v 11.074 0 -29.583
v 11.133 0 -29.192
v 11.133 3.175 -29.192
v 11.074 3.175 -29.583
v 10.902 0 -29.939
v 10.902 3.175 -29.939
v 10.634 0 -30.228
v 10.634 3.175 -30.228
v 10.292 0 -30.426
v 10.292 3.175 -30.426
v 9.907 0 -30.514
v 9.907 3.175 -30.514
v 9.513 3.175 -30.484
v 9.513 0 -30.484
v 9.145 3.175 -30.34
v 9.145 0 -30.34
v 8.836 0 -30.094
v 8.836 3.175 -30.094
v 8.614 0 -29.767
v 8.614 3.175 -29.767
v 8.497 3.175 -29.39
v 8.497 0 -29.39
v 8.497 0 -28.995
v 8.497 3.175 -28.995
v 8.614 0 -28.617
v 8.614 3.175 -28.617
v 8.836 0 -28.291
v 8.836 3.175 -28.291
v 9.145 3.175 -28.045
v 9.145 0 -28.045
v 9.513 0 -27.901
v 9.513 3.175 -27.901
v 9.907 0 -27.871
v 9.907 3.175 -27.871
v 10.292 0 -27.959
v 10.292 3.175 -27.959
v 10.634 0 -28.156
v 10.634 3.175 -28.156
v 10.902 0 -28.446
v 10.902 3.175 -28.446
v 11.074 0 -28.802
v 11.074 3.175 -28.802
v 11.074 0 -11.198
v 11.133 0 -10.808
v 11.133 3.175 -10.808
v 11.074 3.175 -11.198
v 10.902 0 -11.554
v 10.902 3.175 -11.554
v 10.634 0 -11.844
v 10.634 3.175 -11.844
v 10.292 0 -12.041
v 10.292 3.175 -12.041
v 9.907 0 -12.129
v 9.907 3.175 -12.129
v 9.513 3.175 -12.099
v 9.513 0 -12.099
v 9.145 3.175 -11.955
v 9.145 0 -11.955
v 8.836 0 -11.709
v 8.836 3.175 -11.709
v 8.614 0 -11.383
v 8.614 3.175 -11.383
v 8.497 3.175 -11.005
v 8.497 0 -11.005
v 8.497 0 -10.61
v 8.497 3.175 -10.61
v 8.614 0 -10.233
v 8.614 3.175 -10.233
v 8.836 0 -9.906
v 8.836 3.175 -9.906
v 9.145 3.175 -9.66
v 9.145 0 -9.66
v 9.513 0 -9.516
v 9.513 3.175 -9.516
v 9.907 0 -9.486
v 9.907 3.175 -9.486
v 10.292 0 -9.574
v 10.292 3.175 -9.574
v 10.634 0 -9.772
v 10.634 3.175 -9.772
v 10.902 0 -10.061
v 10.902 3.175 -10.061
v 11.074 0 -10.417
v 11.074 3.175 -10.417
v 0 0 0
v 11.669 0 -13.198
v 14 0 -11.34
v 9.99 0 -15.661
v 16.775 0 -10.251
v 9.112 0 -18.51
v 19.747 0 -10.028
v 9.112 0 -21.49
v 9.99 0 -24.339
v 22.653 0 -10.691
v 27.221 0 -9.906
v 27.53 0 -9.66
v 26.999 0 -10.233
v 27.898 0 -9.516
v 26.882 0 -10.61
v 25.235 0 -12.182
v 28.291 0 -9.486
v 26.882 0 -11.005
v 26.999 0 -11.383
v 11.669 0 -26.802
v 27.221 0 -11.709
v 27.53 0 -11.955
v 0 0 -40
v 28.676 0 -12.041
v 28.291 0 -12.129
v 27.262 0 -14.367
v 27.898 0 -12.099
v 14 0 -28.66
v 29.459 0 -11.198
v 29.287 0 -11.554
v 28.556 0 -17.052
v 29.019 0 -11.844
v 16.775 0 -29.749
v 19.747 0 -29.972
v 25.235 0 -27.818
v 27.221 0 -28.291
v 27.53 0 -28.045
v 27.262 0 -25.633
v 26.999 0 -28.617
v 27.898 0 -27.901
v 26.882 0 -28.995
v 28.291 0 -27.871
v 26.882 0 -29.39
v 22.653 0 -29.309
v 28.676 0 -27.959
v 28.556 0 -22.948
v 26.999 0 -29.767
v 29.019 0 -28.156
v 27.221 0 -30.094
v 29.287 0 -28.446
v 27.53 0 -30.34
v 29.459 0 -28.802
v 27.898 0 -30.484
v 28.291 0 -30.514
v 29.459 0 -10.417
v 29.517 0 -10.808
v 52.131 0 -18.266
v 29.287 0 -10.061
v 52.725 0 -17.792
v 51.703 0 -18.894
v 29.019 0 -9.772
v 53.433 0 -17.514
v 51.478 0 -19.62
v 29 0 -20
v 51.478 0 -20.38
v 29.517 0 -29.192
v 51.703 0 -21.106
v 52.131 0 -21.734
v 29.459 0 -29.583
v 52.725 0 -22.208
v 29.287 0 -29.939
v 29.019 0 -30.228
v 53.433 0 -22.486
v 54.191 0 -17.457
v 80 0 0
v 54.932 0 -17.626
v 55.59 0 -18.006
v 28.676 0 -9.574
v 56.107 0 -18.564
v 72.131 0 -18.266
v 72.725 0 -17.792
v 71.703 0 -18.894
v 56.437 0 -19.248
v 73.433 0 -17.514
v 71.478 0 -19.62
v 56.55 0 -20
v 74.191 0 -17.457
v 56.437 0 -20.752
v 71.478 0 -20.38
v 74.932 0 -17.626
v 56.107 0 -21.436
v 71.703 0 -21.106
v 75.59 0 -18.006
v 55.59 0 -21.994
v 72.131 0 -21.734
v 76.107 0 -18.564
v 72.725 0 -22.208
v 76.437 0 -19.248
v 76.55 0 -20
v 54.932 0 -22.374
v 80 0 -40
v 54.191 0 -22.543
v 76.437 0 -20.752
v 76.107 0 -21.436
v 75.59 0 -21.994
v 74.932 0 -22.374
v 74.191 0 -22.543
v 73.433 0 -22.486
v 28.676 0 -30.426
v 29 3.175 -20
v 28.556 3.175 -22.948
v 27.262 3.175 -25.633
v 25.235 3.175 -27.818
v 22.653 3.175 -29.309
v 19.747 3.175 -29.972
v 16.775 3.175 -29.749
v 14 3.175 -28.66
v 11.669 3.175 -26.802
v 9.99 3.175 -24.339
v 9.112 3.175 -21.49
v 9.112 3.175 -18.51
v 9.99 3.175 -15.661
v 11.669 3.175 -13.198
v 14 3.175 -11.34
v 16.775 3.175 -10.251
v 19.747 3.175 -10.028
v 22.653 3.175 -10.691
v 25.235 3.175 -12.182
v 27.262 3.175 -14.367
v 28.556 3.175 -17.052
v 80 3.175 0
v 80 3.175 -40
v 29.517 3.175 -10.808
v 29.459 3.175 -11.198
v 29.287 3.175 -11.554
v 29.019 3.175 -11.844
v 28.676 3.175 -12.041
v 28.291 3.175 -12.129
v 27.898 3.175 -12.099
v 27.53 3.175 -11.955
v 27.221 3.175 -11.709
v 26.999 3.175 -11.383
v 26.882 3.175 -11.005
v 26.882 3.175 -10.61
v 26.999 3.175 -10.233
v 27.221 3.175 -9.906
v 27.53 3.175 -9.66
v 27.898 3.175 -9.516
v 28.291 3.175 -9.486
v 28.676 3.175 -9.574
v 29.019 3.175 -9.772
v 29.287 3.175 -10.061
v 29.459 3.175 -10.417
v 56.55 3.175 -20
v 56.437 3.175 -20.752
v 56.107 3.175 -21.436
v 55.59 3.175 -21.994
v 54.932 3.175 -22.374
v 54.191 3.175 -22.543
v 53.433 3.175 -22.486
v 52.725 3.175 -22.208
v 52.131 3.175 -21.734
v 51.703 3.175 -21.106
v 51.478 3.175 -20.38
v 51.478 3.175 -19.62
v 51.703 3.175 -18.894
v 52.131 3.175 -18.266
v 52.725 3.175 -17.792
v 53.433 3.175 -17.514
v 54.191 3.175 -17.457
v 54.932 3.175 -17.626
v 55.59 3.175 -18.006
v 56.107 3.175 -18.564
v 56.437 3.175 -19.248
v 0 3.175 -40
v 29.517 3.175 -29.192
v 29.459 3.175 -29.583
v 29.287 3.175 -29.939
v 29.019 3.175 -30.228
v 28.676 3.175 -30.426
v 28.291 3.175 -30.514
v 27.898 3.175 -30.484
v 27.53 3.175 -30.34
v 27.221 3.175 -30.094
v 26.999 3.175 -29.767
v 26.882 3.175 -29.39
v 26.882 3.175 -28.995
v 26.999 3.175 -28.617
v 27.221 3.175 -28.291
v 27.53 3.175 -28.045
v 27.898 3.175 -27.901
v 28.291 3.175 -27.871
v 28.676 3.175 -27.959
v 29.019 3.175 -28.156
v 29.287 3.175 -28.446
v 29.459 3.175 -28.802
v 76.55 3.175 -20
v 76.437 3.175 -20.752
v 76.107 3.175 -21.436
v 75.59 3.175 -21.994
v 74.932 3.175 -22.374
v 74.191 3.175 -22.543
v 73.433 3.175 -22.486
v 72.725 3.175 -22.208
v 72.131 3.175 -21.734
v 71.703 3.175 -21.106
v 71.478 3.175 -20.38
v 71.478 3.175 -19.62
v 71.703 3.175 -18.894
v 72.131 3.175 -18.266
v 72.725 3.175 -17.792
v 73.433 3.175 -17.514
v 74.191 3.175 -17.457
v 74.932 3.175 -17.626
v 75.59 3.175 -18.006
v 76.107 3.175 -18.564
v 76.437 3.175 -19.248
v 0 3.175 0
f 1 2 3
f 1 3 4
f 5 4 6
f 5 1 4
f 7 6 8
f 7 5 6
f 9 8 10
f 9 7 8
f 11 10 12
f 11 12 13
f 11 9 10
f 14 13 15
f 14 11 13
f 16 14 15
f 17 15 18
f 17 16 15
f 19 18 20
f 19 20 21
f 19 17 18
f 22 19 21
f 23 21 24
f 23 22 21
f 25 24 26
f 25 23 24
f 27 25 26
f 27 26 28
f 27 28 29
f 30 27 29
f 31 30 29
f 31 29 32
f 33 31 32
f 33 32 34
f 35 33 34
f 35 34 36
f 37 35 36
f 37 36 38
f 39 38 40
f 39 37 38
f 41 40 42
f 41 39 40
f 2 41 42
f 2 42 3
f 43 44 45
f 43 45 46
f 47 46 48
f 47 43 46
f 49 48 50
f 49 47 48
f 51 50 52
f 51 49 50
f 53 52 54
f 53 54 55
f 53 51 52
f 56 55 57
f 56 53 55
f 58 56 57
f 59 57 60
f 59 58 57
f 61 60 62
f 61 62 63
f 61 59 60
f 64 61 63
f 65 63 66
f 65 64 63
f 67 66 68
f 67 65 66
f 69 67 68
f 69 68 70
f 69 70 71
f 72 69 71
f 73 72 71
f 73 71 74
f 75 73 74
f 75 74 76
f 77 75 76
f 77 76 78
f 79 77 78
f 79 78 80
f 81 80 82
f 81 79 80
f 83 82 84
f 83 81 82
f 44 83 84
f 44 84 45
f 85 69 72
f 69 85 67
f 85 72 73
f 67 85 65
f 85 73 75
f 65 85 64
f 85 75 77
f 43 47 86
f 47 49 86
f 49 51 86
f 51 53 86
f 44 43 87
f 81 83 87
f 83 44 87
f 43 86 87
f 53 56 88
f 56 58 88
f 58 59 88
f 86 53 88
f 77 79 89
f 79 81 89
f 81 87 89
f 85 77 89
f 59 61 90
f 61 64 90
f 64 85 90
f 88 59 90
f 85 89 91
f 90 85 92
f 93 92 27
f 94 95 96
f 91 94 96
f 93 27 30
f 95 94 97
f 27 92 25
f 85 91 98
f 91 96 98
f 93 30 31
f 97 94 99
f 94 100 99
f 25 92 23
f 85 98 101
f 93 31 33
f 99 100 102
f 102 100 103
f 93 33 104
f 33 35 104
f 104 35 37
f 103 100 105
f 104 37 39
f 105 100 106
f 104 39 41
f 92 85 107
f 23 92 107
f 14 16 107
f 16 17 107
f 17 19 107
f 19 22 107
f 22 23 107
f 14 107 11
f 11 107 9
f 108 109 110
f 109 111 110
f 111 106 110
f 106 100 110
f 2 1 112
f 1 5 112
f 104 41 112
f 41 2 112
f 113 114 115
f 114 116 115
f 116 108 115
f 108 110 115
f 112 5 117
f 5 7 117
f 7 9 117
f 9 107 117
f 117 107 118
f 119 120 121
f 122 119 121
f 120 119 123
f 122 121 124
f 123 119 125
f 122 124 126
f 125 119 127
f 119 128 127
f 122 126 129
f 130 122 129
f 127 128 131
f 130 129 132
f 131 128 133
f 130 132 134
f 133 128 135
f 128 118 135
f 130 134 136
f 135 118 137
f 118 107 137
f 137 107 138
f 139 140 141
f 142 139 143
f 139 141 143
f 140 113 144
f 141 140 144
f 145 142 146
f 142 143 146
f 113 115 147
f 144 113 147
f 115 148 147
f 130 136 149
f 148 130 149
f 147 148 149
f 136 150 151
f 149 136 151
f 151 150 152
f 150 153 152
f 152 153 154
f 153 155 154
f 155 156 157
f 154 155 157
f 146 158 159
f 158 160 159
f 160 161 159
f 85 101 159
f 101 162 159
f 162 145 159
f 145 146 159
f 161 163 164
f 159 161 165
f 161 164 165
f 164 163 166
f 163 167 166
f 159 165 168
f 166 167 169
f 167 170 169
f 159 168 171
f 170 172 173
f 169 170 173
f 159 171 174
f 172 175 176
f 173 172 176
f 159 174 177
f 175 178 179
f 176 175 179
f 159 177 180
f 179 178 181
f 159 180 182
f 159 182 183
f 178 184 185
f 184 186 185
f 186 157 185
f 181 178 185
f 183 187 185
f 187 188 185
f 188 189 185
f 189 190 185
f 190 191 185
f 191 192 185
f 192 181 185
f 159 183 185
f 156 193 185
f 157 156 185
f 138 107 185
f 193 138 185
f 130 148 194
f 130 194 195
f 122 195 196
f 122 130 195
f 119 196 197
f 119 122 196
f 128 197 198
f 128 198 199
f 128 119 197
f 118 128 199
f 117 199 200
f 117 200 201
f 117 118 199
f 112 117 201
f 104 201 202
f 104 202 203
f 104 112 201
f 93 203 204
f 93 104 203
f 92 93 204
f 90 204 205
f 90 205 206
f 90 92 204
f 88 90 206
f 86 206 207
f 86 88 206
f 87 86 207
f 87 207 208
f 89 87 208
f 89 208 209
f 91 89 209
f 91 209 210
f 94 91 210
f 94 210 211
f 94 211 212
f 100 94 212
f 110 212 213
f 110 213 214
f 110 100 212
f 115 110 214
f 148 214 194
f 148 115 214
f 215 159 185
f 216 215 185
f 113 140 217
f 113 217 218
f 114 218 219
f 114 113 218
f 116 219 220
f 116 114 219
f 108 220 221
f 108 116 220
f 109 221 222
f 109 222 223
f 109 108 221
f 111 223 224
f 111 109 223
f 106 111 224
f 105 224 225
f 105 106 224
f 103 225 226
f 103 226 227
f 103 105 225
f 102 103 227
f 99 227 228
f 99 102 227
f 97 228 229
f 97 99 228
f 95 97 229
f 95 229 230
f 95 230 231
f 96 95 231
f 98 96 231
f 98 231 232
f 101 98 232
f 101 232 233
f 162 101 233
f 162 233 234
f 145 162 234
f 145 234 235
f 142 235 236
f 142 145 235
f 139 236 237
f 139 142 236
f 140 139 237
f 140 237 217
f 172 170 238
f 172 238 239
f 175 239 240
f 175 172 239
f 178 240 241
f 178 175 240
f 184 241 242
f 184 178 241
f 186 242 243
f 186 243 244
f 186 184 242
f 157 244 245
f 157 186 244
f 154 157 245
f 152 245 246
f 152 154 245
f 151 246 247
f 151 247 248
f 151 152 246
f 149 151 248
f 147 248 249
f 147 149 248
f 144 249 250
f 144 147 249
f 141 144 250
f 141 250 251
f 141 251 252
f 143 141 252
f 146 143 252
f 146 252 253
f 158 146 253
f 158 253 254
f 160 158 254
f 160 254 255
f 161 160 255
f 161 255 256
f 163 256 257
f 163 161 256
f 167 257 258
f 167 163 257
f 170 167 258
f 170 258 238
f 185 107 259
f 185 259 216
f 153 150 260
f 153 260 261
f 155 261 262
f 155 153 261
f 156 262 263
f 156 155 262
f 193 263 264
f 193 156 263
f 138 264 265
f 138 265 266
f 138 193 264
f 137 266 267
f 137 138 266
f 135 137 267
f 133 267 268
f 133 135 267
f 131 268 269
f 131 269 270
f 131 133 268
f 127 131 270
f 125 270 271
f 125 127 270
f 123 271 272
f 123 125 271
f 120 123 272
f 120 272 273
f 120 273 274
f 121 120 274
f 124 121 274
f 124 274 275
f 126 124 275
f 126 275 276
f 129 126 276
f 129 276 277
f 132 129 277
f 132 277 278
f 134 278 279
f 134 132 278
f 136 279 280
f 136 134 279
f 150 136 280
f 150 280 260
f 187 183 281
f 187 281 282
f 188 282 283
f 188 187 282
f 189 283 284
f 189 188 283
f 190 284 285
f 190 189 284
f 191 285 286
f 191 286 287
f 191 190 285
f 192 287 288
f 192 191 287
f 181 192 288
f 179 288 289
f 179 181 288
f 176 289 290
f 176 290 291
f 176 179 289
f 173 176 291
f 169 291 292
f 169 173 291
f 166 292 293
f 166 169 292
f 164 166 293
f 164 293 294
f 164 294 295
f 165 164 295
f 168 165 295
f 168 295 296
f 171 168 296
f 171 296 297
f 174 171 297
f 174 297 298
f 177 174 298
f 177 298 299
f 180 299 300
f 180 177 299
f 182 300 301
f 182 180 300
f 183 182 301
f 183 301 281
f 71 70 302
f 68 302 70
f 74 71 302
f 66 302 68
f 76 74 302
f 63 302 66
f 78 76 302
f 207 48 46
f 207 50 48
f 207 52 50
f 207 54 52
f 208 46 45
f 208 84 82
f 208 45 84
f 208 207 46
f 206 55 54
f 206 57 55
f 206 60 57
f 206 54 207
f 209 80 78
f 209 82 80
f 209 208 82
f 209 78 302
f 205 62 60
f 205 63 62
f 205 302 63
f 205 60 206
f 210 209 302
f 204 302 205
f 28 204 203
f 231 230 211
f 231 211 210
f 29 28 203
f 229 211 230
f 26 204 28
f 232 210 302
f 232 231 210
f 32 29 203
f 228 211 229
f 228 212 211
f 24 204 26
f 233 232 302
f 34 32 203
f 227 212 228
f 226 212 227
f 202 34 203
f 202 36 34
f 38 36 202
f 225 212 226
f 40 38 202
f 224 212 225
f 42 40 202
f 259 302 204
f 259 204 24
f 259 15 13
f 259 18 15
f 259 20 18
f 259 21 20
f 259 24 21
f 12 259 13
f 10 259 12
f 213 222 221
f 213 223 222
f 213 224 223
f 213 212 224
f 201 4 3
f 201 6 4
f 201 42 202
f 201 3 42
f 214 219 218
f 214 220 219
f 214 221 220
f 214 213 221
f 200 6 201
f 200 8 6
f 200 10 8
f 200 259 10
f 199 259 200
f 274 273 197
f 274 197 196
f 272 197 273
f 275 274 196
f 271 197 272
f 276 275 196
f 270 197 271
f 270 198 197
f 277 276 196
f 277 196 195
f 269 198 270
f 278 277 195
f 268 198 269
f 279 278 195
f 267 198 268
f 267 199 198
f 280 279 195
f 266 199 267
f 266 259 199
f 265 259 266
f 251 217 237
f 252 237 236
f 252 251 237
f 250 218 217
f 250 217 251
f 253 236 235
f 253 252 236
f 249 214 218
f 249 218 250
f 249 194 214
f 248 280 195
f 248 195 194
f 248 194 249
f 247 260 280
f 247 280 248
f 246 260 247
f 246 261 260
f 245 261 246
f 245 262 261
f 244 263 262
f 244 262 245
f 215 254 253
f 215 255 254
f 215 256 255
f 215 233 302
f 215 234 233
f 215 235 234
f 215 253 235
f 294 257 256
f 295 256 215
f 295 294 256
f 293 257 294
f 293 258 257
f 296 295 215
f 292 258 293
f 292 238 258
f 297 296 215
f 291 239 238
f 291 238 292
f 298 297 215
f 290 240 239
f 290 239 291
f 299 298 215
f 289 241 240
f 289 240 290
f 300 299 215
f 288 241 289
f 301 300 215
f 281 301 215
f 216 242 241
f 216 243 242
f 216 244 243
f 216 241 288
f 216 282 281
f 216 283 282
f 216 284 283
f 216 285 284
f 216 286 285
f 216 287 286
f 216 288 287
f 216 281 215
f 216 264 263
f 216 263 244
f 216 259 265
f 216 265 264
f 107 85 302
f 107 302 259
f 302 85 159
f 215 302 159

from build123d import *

# Parameters (mm, degrees)
SKETCH1_W           = 80
SKETCH1_H           = 40
SKETCH1_R           = 2.55
SKETCH1_R_2         = 10
SKETCH1_R_3         = 1.325
BOSS_EXTRUDE1_DEPTH = 3.175


with BuildPart() as part:
    # Sketch1 → Boss-Extrude1 (new body)
    with BuildSketch(Plane(origin=(0, 0, 0), x_dir=(1, 0, 0), z_dir=(0, 1, 0))):
        with Locations((40, 20)):
            Rectangle(SKETCH1_W, SKETCH1_H)
        with Locations((54, 20)):
            Circle(SKETCH1_R, mode=Mode.SUBTRACT)
        with Locations((74, 20)):
            Circle(SKETCH1_R, mode=Mode.SUBTRACT)
        with Locations((19, 20)):
            Circle(SKETCH1_R_2, mode=Mode.SUBTRACT)
        with Locations((28.192388155, 10.807611845)):
            Circle(SKETCH1_R_3, mode=Mode.SUBTRACT)
        with Locations((9.807611845, 10.807611845)):
            Circle(SKETCH1_R_3, mode=Mode.SUBTRACT)
        with Locations((9.807611845, 29.192388155)):
            Circle(SKETCH1_R_3, mode=Mode.SUBTRACT)
        with Locations((28.192388155, 29.192388155)):
            Circle(SKETCH1_R_3, mode=Mode.SUBTRACT)
    extrude(amount=BOSS_EXTRUDE1_DEPTH)


solid = part.part
